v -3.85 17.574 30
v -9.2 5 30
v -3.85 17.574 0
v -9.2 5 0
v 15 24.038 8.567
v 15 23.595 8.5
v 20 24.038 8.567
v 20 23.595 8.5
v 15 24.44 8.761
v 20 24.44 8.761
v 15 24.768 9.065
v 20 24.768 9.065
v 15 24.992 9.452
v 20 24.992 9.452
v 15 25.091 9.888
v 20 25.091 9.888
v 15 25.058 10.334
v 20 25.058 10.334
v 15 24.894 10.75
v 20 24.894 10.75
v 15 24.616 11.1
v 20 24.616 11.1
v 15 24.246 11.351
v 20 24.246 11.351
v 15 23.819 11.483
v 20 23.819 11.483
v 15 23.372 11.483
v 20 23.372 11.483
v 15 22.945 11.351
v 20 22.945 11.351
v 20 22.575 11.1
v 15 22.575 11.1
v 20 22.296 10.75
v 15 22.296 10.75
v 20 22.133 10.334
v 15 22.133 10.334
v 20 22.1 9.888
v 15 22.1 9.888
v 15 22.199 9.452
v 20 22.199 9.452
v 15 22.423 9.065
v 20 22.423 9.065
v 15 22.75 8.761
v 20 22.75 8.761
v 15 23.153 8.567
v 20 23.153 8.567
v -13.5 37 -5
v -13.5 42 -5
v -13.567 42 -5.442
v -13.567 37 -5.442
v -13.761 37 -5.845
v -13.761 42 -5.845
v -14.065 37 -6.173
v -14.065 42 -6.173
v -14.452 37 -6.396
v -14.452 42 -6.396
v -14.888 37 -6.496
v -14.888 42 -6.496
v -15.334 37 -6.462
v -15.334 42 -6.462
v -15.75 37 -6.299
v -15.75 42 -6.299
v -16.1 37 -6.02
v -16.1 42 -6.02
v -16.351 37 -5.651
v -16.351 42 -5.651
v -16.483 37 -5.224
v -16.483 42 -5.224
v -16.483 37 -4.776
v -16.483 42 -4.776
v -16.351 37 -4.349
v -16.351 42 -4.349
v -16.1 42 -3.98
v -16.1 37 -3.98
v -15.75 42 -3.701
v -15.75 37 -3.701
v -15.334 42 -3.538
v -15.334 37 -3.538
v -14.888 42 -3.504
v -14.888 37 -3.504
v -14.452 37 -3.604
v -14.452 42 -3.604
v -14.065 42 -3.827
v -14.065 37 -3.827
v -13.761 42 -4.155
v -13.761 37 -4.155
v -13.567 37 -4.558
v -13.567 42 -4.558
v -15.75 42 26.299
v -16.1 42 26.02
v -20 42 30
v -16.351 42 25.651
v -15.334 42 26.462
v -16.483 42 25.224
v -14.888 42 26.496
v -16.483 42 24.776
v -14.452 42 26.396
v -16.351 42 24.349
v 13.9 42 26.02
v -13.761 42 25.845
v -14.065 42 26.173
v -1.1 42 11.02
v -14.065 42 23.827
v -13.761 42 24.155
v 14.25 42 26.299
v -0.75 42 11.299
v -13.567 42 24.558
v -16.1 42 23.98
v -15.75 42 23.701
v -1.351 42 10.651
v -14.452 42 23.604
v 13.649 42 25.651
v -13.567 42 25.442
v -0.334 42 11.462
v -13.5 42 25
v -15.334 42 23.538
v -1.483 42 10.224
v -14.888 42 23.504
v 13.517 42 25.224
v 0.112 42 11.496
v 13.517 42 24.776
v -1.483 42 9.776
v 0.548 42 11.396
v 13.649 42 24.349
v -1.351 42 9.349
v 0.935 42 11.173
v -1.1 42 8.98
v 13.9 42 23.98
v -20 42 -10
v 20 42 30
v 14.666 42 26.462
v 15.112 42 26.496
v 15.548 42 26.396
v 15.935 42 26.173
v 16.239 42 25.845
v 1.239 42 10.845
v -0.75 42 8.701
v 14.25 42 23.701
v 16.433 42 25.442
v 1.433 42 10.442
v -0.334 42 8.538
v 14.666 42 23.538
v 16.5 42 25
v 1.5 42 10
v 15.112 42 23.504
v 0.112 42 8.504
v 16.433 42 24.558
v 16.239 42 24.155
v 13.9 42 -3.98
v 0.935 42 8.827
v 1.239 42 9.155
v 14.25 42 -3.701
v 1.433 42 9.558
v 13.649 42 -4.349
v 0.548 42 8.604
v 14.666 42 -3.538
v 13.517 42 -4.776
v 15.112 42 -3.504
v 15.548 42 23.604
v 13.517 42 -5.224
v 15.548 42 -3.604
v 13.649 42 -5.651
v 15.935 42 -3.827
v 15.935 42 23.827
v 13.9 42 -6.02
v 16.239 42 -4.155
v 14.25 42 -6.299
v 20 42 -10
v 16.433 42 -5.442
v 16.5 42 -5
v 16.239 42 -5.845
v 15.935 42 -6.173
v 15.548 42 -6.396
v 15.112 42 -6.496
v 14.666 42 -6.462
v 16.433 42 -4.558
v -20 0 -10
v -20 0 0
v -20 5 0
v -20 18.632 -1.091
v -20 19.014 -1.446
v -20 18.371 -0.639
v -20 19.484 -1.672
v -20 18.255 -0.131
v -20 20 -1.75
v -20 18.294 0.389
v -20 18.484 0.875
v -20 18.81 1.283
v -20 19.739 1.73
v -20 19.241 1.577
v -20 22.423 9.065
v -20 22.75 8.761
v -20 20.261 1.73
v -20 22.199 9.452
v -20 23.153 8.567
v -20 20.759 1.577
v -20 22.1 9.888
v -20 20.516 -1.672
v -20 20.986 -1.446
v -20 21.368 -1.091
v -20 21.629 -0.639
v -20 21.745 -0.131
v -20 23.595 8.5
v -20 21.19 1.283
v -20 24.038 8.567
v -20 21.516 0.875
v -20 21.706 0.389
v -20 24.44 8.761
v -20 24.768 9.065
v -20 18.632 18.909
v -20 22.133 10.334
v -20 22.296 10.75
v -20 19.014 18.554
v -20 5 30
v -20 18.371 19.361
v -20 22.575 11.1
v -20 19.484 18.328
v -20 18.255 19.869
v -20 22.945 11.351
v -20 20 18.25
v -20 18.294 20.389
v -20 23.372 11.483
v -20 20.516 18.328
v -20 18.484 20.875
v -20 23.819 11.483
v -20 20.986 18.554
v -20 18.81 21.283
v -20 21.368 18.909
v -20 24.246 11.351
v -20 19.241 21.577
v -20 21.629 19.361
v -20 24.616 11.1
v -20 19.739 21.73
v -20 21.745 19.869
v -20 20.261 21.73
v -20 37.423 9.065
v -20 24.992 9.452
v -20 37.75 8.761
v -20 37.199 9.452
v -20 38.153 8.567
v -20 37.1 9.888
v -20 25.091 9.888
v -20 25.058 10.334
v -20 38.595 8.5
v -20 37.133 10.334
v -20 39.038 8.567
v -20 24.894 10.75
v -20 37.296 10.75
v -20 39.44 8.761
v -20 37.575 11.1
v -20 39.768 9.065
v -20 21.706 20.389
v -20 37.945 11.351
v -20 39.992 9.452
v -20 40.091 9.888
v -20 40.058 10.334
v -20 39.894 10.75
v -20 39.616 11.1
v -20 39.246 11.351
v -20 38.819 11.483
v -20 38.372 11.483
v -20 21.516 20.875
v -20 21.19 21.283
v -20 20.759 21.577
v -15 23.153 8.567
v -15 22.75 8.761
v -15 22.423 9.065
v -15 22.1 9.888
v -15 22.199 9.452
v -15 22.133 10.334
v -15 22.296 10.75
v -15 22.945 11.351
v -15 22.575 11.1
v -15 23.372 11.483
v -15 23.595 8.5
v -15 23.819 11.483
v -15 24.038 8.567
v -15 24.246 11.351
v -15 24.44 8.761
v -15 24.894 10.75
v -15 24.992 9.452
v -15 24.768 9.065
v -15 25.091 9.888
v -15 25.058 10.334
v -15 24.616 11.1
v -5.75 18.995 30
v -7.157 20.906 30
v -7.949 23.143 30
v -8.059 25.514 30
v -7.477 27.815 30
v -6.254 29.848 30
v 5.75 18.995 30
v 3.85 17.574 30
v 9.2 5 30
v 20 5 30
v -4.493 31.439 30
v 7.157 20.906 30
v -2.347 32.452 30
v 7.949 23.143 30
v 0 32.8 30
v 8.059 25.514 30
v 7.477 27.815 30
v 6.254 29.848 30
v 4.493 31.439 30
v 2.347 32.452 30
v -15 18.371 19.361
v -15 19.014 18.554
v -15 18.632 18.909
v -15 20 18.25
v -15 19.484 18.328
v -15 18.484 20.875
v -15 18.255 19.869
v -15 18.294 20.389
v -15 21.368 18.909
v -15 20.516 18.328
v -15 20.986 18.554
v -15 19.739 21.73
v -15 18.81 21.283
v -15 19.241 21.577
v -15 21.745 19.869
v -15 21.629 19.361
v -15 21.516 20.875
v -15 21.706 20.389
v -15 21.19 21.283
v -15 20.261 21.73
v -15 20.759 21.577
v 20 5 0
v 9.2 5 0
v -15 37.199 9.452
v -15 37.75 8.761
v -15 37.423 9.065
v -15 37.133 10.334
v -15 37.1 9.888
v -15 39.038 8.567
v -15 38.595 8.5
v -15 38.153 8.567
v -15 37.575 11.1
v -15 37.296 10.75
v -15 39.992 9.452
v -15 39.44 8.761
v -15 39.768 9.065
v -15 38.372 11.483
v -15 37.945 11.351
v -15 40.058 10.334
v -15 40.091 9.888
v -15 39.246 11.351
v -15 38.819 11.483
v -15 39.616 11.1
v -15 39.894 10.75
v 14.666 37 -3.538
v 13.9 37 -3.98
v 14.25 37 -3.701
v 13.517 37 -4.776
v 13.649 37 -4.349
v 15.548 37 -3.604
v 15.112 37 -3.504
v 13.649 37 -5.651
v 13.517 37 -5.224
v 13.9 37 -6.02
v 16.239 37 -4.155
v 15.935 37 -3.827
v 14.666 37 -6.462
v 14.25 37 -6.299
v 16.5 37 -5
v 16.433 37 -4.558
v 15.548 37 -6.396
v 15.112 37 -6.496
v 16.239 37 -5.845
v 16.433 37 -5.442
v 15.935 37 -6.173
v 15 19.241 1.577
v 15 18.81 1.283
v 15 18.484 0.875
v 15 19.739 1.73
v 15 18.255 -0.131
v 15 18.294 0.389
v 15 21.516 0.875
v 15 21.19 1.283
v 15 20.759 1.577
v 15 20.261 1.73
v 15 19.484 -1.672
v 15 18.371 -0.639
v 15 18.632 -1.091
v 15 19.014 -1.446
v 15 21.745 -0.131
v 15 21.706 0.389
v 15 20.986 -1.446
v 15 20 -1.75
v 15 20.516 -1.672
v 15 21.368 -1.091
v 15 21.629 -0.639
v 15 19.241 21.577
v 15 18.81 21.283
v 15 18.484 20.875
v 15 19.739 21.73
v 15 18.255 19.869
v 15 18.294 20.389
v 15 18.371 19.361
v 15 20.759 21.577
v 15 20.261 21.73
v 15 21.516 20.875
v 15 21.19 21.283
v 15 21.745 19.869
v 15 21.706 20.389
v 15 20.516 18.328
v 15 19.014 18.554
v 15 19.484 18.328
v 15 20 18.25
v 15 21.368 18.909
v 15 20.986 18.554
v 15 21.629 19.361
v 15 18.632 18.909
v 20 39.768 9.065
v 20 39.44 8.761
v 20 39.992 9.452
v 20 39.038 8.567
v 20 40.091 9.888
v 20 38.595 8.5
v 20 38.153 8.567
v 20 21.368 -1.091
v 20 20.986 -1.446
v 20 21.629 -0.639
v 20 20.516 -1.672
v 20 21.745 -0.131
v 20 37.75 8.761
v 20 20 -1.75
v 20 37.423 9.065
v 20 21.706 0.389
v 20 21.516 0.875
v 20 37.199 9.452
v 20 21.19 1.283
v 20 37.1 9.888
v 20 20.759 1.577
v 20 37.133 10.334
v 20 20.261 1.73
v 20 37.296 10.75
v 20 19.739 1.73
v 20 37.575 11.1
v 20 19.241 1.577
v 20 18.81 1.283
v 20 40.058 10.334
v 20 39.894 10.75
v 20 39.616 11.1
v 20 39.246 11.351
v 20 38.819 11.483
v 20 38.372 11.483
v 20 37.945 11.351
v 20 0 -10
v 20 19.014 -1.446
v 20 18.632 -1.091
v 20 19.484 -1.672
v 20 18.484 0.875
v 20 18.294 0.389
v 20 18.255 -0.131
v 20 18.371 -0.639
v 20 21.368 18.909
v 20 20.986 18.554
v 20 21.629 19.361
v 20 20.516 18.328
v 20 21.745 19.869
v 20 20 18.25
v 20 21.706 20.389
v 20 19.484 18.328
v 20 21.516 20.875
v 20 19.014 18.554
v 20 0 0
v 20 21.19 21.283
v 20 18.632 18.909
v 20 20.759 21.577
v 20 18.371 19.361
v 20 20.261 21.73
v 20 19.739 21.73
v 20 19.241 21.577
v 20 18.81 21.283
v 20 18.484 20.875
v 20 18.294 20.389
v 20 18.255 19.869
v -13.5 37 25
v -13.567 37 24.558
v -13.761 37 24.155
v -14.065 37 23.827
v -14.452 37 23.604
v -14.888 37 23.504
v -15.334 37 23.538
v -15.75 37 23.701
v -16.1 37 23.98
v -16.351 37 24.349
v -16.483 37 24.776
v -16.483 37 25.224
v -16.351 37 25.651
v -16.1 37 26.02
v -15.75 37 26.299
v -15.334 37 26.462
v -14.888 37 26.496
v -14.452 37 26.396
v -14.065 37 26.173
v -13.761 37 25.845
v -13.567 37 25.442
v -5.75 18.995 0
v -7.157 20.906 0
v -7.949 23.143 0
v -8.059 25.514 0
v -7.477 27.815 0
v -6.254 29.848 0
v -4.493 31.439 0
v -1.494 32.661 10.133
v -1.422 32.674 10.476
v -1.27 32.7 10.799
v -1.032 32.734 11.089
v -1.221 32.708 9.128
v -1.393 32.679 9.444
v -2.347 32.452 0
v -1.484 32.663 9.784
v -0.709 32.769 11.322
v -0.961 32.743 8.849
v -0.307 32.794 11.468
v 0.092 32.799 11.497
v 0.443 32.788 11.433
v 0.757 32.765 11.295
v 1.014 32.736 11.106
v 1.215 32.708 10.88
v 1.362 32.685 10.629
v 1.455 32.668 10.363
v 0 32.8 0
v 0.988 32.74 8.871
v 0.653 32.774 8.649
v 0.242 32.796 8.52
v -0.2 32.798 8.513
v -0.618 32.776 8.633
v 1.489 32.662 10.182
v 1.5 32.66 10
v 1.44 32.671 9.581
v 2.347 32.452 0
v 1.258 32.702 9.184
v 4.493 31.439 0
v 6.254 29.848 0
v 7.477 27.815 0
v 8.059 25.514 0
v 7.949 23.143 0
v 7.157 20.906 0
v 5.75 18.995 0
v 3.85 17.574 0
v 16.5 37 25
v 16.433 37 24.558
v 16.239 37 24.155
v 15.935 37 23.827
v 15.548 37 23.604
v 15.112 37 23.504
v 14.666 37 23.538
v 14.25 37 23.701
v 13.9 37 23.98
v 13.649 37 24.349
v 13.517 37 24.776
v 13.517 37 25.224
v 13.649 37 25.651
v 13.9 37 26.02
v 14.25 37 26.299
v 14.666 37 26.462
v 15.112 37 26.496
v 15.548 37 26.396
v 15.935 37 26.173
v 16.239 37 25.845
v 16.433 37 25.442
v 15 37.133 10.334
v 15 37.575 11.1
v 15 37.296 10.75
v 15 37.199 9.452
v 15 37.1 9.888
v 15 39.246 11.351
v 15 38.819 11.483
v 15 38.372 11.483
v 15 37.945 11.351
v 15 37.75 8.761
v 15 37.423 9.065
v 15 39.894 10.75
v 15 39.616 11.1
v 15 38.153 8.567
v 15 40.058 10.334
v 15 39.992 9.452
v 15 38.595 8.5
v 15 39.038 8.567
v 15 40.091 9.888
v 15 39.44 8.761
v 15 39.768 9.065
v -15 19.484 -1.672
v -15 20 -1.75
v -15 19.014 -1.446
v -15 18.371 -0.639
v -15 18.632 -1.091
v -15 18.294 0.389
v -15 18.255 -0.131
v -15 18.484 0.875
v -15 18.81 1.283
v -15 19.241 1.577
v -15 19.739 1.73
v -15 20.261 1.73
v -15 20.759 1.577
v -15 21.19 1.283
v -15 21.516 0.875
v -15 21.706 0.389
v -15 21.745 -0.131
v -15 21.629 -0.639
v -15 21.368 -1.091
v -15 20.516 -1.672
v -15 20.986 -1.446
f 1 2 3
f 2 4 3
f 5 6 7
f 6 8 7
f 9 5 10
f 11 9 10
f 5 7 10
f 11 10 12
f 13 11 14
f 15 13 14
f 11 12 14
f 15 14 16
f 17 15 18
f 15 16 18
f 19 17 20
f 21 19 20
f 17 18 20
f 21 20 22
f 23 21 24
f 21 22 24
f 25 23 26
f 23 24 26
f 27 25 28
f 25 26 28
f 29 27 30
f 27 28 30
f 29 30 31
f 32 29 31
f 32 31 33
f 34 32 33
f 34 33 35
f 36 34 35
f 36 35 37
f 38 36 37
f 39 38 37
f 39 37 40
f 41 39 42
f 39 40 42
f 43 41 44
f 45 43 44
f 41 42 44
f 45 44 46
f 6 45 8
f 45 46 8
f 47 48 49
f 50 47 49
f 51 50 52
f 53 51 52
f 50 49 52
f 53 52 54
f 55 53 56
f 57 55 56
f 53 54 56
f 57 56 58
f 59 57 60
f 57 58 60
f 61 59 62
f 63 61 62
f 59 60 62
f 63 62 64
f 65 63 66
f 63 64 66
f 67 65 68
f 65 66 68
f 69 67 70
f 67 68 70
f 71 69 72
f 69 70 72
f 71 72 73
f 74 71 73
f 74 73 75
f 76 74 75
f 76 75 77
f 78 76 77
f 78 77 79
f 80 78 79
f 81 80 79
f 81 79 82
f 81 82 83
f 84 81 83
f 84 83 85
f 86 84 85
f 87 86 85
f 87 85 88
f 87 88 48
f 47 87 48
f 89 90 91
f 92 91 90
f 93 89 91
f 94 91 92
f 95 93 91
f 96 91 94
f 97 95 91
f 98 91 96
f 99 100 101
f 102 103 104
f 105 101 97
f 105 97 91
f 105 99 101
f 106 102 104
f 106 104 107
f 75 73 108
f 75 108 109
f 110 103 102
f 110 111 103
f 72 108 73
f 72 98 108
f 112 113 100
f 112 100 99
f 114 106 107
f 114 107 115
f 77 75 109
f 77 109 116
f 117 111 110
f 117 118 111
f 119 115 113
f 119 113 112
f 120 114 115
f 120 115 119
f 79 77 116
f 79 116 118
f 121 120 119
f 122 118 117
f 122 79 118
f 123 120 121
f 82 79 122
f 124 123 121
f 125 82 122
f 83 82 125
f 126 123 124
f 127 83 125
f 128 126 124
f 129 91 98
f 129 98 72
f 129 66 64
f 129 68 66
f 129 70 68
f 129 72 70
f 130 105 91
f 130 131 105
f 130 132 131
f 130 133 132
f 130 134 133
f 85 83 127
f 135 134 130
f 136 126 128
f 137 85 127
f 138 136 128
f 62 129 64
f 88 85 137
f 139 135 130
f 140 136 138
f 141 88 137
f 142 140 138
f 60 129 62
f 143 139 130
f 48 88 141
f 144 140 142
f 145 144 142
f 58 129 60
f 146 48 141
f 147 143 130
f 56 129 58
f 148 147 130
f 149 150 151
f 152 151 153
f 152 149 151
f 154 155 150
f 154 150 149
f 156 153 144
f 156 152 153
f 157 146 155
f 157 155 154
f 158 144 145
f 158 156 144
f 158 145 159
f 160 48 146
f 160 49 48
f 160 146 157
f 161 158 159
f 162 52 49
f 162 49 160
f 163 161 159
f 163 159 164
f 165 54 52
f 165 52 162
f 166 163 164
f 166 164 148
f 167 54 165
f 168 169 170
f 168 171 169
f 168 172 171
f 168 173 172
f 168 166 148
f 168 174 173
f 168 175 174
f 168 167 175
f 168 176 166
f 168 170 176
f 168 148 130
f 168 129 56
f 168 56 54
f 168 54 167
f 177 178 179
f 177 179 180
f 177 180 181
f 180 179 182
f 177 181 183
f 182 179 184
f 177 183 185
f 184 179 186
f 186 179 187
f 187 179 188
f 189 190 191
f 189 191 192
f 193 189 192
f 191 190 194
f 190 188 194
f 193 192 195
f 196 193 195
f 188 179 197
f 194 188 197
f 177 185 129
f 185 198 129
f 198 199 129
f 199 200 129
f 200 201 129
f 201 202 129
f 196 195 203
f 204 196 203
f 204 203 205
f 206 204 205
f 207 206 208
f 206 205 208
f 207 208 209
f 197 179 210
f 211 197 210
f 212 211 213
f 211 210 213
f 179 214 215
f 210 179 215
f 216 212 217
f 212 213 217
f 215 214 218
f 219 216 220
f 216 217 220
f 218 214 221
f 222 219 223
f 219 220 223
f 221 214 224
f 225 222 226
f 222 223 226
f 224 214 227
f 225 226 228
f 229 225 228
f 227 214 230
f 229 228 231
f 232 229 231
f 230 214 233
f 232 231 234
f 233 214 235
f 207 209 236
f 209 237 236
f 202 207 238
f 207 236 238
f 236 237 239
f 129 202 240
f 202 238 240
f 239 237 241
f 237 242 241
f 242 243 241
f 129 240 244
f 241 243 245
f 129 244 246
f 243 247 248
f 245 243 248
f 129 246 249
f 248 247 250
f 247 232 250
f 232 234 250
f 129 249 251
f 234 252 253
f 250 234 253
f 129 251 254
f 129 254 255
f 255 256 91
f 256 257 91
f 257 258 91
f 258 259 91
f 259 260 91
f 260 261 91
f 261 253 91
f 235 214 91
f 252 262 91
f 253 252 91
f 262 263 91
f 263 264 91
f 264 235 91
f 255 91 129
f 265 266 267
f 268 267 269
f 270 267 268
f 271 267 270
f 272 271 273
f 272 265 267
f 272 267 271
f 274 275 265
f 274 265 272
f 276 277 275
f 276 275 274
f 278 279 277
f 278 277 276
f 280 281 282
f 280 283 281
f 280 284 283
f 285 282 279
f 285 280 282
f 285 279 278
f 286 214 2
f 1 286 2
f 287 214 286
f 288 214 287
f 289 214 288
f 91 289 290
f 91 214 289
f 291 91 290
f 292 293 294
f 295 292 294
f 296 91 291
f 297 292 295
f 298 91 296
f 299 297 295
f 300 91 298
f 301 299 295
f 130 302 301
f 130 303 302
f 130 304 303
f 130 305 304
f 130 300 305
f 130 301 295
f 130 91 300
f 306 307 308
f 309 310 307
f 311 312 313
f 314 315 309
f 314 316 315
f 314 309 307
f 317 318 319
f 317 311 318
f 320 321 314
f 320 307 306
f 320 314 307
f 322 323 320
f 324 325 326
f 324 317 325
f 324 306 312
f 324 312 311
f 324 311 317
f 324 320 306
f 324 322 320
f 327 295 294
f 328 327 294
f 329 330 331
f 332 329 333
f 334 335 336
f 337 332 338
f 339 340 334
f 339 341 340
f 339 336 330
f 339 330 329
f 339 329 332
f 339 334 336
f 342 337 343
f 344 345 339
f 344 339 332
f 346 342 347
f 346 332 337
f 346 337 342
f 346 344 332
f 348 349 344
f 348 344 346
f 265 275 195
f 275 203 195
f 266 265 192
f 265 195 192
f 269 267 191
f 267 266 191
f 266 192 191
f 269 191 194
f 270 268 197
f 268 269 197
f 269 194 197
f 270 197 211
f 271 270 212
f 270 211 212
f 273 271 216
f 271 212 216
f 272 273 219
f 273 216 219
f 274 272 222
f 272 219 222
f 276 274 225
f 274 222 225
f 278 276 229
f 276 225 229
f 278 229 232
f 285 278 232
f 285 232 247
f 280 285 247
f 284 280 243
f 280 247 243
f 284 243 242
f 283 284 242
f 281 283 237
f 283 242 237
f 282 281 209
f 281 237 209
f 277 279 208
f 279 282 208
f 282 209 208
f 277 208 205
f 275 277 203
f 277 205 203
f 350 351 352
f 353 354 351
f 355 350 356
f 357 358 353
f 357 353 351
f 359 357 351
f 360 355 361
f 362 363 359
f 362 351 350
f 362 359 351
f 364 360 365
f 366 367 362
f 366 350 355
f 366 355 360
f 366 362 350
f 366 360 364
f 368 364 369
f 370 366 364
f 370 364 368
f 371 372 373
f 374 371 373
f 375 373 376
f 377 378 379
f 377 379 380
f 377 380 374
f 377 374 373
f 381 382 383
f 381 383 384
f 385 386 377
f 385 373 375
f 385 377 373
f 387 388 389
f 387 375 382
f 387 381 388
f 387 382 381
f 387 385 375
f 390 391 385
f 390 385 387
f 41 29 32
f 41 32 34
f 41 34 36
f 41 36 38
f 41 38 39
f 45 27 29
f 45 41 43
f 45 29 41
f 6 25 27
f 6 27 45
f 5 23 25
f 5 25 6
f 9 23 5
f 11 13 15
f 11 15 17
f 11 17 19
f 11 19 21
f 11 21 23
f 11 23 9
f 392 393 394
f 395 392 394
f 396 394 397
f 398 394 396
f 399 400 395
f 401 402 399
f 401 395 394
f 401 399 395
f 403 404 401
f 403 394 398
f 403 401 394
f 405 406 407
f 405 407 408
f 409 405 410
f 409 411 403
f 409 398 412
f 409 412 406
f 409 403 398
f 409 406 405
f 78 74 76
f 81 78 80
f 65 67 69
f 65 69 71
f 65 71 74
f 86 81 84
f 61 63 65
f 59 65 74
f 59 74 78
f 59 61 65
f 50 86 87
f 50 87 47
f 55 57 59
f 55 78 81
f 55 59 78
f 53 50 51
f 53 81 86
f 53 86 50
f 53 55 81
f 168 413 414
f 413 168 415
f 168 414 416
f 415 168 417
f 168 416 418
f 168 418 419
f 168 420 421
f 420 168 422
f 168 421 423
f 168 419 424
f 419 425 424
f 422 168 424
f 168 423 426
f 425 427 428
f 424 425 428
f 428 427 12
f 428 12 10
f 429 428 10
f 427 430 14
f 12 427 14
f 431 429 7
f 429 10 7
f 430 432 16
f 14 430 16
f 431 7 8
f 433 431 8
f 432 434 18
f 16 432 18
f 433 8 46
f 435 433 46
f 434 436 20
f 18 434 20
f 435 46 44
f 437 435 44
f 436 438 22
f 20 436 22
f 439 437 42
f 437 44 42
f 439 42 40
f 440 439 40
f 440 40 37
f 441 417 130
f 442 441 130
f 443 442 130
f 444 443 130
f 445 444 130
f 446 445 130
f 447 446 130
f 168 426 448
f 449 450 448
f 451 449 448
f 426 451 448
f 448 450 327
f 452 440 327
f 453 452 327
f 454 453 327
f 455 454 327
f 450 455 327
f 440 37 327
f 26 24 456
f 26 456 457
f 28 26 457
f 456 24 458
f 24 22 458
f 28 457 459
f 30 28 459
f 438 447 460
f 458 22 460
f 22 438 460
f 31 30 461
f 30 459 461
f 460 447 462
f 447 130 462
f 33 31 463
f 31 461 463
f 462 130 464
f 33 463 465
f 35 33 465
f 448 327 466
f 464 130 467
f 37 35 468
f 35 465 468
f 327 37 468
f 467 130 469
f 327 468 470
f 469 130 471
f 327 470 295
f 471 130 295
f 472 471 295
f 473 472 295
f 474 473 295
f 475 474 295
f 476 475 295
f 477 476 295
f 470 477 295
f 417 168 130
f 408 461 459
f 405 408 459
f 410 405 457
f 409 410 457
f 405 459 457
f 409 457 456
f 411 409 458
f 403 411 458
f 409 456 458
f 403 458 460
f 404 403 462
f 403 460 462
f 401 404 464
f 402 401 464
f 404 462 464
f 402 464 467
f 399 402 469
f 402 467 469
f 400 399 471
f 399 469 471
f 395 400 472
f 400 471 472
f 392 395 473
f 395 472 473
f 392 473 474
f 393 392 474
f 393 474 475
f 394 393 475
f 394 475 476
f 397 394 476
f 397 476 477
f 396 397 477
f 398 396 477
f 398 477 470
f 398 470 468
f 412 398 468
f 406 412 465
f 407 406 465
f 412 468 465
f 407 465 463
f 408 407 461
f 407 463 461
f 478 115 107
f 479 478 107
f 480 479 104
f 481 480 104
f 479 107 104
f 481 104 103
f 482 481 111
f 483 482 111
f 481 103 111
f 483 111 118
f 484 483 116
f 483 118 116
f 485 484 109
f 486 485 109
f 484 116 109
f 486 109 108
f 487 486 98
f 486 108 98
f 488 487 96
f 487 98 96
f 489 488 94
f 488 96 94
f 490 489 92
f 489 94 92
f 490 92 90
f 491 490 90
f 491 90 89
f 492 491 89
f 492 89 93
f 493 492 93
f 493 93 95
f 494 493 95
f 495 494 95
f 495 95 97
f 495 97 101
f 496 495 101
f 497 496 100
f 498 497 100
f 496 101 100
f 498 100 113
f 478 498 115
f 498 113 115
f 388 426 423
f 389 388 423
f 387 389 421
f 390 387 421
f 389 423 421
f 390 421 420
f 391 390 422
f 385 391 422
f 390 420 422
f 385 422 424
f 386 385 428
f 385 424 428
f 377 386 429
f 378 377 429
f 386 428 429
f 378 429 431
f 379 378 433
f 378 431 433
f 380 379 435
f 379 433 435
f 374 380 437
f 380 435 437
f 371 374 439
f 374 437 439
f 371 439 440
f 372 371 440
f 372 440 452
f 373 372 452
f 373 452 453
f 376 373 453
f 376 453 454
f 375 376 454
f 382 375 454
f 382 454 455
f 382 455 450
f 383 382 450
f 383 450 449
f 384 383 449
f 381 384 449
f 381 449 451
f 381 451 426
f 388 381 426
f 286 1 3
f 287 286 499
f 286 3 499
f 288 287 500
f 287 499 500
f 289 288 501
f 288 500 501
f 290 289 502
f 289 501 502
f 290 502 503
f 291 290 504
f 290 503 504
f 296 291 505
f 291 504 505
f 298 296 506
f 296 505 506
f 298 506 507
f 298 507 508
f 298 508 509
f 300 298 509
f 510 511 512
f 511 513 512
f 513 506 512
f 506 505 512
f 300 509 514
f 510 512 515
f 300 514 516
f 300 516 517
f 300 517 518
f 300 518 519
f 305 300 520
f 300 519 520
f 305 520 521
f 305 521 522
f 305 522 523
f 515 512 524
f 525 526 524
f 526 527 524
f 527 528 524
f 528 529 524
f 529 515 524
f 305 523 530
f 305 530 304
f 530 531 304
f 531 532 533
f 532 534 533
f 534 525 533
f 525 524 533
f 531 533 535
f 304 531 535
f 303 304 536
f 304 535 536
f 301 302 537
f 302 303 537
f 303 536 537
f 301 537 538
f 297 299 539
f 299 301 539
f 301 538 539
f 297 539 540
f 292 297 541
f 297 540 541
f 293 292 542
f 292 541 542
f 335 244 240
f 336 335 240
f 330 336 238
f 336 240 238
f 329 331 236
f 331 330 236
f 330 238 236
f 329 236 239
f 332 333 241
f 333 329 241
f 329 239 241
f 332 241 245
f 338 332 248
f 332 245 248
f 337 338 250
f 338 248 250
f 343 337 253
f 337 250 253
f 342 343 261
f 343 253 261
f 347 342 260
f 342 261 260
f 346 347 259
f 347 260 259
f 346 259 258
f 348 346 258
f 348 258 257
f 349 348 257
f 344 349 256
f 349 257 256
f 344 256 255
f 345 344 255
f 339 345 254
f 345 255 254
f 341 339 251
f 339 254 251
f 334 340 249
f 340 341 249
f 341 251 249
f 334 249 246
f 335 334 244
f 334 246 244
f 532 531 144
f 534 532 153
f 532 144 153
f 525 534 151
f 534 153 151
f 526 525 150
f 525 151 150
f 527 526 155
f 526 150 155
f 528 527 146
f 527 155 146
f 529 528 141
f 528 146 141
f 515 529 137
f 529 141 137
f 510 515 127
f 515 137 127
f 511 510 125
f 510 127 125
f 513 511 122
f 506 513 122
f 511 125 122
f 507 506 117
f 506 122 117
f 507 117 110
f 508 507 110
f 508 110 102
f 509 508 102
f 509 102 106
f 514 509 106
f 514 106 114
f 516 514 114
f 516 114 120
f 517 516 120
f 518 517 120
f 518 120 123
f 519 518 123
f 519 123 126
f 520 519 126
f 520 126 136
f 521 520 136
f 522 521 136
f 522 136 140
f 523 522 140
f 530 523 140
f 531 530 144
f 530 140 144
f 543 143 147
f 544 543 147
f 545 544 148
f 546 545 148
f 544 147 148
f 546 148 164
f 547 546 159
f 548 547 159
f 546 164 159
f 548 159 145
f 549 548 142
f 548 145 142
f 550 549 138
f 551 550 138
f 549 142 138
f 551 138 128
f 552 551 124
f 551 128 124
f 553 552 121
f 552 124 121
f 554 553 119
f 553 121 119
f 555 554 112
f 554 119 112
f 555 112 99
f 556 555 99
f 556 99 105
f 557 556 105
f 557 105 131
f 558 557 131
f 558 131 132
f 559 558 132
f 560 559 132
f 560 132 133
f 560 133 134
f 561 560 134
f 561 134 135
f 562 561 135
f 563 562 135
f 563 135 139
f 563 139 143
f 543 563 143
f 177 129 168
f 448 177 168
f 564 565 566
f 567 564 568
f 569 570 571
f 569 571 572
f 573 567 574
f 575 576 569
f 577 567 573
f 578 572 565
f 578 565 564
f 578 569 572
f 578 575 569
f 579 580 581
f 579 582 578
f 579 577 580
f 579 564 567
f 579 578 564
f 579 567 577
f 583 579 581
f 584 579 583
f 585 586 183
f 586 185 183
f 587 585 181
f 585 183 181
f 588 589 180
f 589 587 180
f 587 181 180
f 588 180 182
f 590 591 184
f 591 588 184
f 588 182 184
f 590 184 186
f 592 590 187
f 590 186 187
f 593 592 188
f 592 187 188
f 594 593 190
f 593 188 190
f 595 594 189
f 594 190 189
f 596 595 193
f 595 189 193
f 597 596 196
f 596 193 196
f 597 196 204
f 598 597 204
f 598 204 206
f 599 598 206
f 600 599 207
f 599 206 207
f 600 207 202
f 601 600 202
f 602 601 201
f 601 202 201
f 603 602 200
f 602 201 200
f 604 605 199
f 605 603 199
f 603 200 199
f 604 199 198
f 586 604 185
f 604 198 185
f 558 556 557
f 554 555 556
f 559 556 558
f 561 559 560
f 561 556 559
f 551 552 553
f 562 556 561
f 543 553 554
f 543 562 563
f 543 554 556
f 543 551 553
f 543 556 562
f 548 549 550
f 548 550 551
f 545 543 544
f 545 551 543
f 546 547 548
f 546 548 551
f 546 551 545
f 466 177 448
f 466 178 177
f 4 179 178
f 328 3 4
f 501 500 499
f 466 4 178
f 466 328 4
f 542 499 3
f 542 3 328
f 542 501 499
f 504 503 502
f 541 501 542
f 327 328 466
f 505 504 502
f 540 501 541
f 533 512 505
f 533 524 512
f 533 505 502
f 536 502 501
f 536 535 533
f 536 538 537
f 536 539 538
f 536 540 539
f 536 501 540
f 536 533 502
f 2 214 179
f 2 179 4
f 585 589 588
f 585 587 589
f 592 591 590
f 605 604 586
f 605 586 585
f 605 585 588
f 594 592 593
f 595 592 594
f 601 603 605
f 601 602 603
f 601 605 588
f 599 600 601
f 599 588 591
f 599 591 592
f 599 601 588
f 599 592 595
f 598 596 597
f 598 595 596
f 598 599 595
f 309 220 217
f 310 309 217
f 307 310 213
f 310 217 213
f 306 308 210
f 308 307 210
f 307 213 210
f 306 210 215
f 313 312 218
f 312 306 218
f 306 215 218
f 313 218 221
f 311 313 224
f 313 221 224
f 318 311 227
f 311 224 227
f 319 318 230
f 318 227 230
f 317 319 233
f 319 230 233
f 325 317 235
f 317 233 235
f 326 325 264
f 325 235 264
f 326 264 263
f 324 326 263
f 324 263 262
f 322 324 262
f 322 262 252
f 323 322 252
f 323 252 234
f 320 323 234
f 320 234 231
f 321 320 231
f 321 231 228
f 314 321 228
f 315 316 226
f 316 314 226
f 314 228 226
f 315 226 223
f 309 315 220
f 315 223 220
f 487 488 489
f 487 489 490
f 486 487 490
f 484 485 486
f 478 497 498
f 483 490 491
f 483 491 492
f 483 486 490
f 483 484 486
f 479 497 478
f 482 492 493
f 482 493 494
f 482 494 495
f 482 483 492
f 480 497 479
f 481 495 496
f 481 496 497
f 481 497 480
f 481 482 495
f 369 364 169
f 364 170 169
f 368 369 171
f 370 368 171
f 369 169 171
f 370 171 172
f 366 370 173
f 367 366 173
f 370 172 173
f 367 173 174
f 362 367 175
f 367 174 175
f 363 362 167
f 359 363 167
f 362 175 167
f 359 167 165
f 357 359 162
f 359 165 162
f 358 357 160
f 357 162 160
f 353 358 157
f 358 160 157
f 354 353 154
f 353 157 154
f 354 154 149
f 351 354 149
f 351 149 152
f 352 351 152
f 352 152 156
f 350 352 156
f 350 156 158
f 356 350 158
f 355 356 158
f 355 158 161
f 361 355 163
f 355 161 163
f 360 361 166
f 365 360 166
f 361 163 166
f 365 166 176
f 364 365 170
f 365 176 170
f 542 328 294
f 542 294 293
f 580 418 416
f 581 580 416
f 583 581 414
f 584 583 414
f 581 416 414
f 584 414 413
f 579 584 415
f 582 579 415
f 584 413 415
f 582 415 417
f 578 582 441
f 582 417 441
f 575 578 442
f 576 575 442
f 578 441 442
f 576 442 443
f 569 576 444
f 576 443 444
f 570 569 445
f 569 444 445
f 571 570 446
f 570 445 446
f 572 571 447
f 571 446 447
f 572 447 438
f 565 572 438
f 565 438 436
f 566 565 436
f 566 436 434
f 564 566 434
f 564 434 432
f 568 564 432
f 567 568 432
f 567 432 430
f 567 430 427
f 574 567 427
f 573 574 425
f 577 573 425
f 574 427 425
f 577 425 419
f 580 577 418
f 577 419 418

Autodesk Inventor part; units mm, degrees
ref_plane "YZ Plane" through (0, 0, 0) normal (1, 0, 0) x (0, 1, 0)
ref_plane "XZ Plane" through (0, 0, 0) normal (0, 1, 0) x (-1, 0, 0)
ref_plane "XY Plane" through (0, 0, 0) normal (0, 0, 1) x (1, 0, 0)
sketch "Sketch1" plane through (0, 0, 0) normal (0, 0, 1) x (1, 0, 0)
  circle A0 centre (0, 24.7) radius 8.1
  line L0 (0, 24.7) -> (0, 0) construction
  line L1 (0, 0) -> (-20, 0) construction
  line L2 (-20, 5) -> (-9.2, 5)
  line L3 (-9.2, 5) -> (-3.85, 17.5735)
  line L4 (0, 0) -> (20, 0) construction
  line L5 (20, 0) -> (20, 5) construction
  line L6 (20, 5) -> (9.2, 5)
  line L7 (9.2, 5) -> (3.85, 17.5735)
  line L8 (0, 24.7) -> (0, 32.8) construction
  line L9 (-3.85, 17.5735) -> (3.85, 17.5735) construction
  line L10 (-20, 5) -> (-20, 42)
  line L11 (-20, 42) -> (20, 42)
  line L12 (20, 42) -> (20, 5)
  line L13 (-20, 5) -> (-20, 0)
  line L14 (-20, 0) -> (20, 0)
  line L15 (20, 0) -> (20, 5)
  line L16 (-9.2, 5) -> (9.2, 5)
  point P0 (0, 42)
  point P1 (-20, 5)
  dimension "d0" = 16.2
  dimension "d2" = 5
  dimension "d5" = 7.7
  dimension "d91" = 42
  dimension "d102" = 19.7
  dimension "d103" = 18.4
  dimension "d104" = 40
extrude "Extrusion1" add sketch "Sketch1" along normal blind 30 contours A0 L3 L2 L10 L11 L12 L6 L7
extrude "Extrusion2" add sketch "Sketch1" against normal blind 10
sketch "Sketch6" plane through (-20, 42, 30) normal (0, 1, 0) x (1, 0, 0)
  line L0 (0, 40) -> (0, 0) projected
  line L1 (40, 0) -> (0, 0) projected
  line L2 (0, 40) -> (40, 0) construction
  line L3 (40, 40) -> (0, 0) construction
  circle A0 centre (35, 5) radius 1.5
  circle A1 centre (5, 5) radius 1.5
  circle A2 centre (5, 35) radius 1.5
  circle A3 centre (35, 35) radius 1.5
  line L4 (35, 35) -> (35, 5) construction
  line L5 (5, 5) -> (35, 5) construction
  line L6 (5, 5) -> (5, 35) construction
  circle A4 centre (20, 20) radius 1.5
  line L7 (40, 40) -> (40, 0) projected
  line L8 (0, 40) -> (40, 40) projected
  point P0 (20, 30)
  dimension "d69" = 30
  dimension "d70" = 3
  dimension "d73" = 3
extrude "Extrusion8" cut sketch "Sketch6" against normal blind 5 contours A0 | A1 | A2 | A3
extrude "Extrusion9" cut sketch "Sketch6" against normal through all contours A4
sketch "Sketch8" plane through (20, 5, 30) normal (1, 0, 0) x (0, 0, -1)
  line L0 (0, 0) -> (0, 37) projected
  line L1 (30, 0) -> (0, 0) projected
  line L2 (20, 37) -> (20, 15) construction
  line L3 (20, 15) -> (10, 15) construction
  line L4 (20, 15) -> (30, 15) construction
  circle A0 centre (10, 15) radius 1.75
  circle A1 centre (30, 15) radius 1.75
  line L5 (40, 37) -> (0, 37) projected
  line L6 (30, -5) -> (30, 0) projected
  line L7 (30, -5) -> (40, -5) projected
  line L8 (40, 37) -> (40, -5) projected
  line L9 (20, 33.5954) -> (20, 18.5954) construction
  circle A2 centre (20, 33.5954) radius 1.5
  circle A3 centre (20, 18.5954) radius 1.5
  line L10 (20, 26.0954) -> (0, 26.0954) construction
  point P0 (30, -5)
  point P1 (35, -5)
  dimension "d97" = 3.5
  dimension "d98" = 3.5
  dimension "d105" = 20
  dimension "d106" = 20
  dimension "d107" = 20
  dimension "d108" = 15
  dimension "d109" = 20
  dimension "d110" = 3
extrude "Extrusion12" cut sketch "Sketch8" against normal blind 5 contours A0 | A1 | A2 | A3
mirror "Mirror1" about plane through (0, 0, 0) normal (1, 0, 0) of "Extrusion12"
properties part number "X Axis End_3DPrint"
